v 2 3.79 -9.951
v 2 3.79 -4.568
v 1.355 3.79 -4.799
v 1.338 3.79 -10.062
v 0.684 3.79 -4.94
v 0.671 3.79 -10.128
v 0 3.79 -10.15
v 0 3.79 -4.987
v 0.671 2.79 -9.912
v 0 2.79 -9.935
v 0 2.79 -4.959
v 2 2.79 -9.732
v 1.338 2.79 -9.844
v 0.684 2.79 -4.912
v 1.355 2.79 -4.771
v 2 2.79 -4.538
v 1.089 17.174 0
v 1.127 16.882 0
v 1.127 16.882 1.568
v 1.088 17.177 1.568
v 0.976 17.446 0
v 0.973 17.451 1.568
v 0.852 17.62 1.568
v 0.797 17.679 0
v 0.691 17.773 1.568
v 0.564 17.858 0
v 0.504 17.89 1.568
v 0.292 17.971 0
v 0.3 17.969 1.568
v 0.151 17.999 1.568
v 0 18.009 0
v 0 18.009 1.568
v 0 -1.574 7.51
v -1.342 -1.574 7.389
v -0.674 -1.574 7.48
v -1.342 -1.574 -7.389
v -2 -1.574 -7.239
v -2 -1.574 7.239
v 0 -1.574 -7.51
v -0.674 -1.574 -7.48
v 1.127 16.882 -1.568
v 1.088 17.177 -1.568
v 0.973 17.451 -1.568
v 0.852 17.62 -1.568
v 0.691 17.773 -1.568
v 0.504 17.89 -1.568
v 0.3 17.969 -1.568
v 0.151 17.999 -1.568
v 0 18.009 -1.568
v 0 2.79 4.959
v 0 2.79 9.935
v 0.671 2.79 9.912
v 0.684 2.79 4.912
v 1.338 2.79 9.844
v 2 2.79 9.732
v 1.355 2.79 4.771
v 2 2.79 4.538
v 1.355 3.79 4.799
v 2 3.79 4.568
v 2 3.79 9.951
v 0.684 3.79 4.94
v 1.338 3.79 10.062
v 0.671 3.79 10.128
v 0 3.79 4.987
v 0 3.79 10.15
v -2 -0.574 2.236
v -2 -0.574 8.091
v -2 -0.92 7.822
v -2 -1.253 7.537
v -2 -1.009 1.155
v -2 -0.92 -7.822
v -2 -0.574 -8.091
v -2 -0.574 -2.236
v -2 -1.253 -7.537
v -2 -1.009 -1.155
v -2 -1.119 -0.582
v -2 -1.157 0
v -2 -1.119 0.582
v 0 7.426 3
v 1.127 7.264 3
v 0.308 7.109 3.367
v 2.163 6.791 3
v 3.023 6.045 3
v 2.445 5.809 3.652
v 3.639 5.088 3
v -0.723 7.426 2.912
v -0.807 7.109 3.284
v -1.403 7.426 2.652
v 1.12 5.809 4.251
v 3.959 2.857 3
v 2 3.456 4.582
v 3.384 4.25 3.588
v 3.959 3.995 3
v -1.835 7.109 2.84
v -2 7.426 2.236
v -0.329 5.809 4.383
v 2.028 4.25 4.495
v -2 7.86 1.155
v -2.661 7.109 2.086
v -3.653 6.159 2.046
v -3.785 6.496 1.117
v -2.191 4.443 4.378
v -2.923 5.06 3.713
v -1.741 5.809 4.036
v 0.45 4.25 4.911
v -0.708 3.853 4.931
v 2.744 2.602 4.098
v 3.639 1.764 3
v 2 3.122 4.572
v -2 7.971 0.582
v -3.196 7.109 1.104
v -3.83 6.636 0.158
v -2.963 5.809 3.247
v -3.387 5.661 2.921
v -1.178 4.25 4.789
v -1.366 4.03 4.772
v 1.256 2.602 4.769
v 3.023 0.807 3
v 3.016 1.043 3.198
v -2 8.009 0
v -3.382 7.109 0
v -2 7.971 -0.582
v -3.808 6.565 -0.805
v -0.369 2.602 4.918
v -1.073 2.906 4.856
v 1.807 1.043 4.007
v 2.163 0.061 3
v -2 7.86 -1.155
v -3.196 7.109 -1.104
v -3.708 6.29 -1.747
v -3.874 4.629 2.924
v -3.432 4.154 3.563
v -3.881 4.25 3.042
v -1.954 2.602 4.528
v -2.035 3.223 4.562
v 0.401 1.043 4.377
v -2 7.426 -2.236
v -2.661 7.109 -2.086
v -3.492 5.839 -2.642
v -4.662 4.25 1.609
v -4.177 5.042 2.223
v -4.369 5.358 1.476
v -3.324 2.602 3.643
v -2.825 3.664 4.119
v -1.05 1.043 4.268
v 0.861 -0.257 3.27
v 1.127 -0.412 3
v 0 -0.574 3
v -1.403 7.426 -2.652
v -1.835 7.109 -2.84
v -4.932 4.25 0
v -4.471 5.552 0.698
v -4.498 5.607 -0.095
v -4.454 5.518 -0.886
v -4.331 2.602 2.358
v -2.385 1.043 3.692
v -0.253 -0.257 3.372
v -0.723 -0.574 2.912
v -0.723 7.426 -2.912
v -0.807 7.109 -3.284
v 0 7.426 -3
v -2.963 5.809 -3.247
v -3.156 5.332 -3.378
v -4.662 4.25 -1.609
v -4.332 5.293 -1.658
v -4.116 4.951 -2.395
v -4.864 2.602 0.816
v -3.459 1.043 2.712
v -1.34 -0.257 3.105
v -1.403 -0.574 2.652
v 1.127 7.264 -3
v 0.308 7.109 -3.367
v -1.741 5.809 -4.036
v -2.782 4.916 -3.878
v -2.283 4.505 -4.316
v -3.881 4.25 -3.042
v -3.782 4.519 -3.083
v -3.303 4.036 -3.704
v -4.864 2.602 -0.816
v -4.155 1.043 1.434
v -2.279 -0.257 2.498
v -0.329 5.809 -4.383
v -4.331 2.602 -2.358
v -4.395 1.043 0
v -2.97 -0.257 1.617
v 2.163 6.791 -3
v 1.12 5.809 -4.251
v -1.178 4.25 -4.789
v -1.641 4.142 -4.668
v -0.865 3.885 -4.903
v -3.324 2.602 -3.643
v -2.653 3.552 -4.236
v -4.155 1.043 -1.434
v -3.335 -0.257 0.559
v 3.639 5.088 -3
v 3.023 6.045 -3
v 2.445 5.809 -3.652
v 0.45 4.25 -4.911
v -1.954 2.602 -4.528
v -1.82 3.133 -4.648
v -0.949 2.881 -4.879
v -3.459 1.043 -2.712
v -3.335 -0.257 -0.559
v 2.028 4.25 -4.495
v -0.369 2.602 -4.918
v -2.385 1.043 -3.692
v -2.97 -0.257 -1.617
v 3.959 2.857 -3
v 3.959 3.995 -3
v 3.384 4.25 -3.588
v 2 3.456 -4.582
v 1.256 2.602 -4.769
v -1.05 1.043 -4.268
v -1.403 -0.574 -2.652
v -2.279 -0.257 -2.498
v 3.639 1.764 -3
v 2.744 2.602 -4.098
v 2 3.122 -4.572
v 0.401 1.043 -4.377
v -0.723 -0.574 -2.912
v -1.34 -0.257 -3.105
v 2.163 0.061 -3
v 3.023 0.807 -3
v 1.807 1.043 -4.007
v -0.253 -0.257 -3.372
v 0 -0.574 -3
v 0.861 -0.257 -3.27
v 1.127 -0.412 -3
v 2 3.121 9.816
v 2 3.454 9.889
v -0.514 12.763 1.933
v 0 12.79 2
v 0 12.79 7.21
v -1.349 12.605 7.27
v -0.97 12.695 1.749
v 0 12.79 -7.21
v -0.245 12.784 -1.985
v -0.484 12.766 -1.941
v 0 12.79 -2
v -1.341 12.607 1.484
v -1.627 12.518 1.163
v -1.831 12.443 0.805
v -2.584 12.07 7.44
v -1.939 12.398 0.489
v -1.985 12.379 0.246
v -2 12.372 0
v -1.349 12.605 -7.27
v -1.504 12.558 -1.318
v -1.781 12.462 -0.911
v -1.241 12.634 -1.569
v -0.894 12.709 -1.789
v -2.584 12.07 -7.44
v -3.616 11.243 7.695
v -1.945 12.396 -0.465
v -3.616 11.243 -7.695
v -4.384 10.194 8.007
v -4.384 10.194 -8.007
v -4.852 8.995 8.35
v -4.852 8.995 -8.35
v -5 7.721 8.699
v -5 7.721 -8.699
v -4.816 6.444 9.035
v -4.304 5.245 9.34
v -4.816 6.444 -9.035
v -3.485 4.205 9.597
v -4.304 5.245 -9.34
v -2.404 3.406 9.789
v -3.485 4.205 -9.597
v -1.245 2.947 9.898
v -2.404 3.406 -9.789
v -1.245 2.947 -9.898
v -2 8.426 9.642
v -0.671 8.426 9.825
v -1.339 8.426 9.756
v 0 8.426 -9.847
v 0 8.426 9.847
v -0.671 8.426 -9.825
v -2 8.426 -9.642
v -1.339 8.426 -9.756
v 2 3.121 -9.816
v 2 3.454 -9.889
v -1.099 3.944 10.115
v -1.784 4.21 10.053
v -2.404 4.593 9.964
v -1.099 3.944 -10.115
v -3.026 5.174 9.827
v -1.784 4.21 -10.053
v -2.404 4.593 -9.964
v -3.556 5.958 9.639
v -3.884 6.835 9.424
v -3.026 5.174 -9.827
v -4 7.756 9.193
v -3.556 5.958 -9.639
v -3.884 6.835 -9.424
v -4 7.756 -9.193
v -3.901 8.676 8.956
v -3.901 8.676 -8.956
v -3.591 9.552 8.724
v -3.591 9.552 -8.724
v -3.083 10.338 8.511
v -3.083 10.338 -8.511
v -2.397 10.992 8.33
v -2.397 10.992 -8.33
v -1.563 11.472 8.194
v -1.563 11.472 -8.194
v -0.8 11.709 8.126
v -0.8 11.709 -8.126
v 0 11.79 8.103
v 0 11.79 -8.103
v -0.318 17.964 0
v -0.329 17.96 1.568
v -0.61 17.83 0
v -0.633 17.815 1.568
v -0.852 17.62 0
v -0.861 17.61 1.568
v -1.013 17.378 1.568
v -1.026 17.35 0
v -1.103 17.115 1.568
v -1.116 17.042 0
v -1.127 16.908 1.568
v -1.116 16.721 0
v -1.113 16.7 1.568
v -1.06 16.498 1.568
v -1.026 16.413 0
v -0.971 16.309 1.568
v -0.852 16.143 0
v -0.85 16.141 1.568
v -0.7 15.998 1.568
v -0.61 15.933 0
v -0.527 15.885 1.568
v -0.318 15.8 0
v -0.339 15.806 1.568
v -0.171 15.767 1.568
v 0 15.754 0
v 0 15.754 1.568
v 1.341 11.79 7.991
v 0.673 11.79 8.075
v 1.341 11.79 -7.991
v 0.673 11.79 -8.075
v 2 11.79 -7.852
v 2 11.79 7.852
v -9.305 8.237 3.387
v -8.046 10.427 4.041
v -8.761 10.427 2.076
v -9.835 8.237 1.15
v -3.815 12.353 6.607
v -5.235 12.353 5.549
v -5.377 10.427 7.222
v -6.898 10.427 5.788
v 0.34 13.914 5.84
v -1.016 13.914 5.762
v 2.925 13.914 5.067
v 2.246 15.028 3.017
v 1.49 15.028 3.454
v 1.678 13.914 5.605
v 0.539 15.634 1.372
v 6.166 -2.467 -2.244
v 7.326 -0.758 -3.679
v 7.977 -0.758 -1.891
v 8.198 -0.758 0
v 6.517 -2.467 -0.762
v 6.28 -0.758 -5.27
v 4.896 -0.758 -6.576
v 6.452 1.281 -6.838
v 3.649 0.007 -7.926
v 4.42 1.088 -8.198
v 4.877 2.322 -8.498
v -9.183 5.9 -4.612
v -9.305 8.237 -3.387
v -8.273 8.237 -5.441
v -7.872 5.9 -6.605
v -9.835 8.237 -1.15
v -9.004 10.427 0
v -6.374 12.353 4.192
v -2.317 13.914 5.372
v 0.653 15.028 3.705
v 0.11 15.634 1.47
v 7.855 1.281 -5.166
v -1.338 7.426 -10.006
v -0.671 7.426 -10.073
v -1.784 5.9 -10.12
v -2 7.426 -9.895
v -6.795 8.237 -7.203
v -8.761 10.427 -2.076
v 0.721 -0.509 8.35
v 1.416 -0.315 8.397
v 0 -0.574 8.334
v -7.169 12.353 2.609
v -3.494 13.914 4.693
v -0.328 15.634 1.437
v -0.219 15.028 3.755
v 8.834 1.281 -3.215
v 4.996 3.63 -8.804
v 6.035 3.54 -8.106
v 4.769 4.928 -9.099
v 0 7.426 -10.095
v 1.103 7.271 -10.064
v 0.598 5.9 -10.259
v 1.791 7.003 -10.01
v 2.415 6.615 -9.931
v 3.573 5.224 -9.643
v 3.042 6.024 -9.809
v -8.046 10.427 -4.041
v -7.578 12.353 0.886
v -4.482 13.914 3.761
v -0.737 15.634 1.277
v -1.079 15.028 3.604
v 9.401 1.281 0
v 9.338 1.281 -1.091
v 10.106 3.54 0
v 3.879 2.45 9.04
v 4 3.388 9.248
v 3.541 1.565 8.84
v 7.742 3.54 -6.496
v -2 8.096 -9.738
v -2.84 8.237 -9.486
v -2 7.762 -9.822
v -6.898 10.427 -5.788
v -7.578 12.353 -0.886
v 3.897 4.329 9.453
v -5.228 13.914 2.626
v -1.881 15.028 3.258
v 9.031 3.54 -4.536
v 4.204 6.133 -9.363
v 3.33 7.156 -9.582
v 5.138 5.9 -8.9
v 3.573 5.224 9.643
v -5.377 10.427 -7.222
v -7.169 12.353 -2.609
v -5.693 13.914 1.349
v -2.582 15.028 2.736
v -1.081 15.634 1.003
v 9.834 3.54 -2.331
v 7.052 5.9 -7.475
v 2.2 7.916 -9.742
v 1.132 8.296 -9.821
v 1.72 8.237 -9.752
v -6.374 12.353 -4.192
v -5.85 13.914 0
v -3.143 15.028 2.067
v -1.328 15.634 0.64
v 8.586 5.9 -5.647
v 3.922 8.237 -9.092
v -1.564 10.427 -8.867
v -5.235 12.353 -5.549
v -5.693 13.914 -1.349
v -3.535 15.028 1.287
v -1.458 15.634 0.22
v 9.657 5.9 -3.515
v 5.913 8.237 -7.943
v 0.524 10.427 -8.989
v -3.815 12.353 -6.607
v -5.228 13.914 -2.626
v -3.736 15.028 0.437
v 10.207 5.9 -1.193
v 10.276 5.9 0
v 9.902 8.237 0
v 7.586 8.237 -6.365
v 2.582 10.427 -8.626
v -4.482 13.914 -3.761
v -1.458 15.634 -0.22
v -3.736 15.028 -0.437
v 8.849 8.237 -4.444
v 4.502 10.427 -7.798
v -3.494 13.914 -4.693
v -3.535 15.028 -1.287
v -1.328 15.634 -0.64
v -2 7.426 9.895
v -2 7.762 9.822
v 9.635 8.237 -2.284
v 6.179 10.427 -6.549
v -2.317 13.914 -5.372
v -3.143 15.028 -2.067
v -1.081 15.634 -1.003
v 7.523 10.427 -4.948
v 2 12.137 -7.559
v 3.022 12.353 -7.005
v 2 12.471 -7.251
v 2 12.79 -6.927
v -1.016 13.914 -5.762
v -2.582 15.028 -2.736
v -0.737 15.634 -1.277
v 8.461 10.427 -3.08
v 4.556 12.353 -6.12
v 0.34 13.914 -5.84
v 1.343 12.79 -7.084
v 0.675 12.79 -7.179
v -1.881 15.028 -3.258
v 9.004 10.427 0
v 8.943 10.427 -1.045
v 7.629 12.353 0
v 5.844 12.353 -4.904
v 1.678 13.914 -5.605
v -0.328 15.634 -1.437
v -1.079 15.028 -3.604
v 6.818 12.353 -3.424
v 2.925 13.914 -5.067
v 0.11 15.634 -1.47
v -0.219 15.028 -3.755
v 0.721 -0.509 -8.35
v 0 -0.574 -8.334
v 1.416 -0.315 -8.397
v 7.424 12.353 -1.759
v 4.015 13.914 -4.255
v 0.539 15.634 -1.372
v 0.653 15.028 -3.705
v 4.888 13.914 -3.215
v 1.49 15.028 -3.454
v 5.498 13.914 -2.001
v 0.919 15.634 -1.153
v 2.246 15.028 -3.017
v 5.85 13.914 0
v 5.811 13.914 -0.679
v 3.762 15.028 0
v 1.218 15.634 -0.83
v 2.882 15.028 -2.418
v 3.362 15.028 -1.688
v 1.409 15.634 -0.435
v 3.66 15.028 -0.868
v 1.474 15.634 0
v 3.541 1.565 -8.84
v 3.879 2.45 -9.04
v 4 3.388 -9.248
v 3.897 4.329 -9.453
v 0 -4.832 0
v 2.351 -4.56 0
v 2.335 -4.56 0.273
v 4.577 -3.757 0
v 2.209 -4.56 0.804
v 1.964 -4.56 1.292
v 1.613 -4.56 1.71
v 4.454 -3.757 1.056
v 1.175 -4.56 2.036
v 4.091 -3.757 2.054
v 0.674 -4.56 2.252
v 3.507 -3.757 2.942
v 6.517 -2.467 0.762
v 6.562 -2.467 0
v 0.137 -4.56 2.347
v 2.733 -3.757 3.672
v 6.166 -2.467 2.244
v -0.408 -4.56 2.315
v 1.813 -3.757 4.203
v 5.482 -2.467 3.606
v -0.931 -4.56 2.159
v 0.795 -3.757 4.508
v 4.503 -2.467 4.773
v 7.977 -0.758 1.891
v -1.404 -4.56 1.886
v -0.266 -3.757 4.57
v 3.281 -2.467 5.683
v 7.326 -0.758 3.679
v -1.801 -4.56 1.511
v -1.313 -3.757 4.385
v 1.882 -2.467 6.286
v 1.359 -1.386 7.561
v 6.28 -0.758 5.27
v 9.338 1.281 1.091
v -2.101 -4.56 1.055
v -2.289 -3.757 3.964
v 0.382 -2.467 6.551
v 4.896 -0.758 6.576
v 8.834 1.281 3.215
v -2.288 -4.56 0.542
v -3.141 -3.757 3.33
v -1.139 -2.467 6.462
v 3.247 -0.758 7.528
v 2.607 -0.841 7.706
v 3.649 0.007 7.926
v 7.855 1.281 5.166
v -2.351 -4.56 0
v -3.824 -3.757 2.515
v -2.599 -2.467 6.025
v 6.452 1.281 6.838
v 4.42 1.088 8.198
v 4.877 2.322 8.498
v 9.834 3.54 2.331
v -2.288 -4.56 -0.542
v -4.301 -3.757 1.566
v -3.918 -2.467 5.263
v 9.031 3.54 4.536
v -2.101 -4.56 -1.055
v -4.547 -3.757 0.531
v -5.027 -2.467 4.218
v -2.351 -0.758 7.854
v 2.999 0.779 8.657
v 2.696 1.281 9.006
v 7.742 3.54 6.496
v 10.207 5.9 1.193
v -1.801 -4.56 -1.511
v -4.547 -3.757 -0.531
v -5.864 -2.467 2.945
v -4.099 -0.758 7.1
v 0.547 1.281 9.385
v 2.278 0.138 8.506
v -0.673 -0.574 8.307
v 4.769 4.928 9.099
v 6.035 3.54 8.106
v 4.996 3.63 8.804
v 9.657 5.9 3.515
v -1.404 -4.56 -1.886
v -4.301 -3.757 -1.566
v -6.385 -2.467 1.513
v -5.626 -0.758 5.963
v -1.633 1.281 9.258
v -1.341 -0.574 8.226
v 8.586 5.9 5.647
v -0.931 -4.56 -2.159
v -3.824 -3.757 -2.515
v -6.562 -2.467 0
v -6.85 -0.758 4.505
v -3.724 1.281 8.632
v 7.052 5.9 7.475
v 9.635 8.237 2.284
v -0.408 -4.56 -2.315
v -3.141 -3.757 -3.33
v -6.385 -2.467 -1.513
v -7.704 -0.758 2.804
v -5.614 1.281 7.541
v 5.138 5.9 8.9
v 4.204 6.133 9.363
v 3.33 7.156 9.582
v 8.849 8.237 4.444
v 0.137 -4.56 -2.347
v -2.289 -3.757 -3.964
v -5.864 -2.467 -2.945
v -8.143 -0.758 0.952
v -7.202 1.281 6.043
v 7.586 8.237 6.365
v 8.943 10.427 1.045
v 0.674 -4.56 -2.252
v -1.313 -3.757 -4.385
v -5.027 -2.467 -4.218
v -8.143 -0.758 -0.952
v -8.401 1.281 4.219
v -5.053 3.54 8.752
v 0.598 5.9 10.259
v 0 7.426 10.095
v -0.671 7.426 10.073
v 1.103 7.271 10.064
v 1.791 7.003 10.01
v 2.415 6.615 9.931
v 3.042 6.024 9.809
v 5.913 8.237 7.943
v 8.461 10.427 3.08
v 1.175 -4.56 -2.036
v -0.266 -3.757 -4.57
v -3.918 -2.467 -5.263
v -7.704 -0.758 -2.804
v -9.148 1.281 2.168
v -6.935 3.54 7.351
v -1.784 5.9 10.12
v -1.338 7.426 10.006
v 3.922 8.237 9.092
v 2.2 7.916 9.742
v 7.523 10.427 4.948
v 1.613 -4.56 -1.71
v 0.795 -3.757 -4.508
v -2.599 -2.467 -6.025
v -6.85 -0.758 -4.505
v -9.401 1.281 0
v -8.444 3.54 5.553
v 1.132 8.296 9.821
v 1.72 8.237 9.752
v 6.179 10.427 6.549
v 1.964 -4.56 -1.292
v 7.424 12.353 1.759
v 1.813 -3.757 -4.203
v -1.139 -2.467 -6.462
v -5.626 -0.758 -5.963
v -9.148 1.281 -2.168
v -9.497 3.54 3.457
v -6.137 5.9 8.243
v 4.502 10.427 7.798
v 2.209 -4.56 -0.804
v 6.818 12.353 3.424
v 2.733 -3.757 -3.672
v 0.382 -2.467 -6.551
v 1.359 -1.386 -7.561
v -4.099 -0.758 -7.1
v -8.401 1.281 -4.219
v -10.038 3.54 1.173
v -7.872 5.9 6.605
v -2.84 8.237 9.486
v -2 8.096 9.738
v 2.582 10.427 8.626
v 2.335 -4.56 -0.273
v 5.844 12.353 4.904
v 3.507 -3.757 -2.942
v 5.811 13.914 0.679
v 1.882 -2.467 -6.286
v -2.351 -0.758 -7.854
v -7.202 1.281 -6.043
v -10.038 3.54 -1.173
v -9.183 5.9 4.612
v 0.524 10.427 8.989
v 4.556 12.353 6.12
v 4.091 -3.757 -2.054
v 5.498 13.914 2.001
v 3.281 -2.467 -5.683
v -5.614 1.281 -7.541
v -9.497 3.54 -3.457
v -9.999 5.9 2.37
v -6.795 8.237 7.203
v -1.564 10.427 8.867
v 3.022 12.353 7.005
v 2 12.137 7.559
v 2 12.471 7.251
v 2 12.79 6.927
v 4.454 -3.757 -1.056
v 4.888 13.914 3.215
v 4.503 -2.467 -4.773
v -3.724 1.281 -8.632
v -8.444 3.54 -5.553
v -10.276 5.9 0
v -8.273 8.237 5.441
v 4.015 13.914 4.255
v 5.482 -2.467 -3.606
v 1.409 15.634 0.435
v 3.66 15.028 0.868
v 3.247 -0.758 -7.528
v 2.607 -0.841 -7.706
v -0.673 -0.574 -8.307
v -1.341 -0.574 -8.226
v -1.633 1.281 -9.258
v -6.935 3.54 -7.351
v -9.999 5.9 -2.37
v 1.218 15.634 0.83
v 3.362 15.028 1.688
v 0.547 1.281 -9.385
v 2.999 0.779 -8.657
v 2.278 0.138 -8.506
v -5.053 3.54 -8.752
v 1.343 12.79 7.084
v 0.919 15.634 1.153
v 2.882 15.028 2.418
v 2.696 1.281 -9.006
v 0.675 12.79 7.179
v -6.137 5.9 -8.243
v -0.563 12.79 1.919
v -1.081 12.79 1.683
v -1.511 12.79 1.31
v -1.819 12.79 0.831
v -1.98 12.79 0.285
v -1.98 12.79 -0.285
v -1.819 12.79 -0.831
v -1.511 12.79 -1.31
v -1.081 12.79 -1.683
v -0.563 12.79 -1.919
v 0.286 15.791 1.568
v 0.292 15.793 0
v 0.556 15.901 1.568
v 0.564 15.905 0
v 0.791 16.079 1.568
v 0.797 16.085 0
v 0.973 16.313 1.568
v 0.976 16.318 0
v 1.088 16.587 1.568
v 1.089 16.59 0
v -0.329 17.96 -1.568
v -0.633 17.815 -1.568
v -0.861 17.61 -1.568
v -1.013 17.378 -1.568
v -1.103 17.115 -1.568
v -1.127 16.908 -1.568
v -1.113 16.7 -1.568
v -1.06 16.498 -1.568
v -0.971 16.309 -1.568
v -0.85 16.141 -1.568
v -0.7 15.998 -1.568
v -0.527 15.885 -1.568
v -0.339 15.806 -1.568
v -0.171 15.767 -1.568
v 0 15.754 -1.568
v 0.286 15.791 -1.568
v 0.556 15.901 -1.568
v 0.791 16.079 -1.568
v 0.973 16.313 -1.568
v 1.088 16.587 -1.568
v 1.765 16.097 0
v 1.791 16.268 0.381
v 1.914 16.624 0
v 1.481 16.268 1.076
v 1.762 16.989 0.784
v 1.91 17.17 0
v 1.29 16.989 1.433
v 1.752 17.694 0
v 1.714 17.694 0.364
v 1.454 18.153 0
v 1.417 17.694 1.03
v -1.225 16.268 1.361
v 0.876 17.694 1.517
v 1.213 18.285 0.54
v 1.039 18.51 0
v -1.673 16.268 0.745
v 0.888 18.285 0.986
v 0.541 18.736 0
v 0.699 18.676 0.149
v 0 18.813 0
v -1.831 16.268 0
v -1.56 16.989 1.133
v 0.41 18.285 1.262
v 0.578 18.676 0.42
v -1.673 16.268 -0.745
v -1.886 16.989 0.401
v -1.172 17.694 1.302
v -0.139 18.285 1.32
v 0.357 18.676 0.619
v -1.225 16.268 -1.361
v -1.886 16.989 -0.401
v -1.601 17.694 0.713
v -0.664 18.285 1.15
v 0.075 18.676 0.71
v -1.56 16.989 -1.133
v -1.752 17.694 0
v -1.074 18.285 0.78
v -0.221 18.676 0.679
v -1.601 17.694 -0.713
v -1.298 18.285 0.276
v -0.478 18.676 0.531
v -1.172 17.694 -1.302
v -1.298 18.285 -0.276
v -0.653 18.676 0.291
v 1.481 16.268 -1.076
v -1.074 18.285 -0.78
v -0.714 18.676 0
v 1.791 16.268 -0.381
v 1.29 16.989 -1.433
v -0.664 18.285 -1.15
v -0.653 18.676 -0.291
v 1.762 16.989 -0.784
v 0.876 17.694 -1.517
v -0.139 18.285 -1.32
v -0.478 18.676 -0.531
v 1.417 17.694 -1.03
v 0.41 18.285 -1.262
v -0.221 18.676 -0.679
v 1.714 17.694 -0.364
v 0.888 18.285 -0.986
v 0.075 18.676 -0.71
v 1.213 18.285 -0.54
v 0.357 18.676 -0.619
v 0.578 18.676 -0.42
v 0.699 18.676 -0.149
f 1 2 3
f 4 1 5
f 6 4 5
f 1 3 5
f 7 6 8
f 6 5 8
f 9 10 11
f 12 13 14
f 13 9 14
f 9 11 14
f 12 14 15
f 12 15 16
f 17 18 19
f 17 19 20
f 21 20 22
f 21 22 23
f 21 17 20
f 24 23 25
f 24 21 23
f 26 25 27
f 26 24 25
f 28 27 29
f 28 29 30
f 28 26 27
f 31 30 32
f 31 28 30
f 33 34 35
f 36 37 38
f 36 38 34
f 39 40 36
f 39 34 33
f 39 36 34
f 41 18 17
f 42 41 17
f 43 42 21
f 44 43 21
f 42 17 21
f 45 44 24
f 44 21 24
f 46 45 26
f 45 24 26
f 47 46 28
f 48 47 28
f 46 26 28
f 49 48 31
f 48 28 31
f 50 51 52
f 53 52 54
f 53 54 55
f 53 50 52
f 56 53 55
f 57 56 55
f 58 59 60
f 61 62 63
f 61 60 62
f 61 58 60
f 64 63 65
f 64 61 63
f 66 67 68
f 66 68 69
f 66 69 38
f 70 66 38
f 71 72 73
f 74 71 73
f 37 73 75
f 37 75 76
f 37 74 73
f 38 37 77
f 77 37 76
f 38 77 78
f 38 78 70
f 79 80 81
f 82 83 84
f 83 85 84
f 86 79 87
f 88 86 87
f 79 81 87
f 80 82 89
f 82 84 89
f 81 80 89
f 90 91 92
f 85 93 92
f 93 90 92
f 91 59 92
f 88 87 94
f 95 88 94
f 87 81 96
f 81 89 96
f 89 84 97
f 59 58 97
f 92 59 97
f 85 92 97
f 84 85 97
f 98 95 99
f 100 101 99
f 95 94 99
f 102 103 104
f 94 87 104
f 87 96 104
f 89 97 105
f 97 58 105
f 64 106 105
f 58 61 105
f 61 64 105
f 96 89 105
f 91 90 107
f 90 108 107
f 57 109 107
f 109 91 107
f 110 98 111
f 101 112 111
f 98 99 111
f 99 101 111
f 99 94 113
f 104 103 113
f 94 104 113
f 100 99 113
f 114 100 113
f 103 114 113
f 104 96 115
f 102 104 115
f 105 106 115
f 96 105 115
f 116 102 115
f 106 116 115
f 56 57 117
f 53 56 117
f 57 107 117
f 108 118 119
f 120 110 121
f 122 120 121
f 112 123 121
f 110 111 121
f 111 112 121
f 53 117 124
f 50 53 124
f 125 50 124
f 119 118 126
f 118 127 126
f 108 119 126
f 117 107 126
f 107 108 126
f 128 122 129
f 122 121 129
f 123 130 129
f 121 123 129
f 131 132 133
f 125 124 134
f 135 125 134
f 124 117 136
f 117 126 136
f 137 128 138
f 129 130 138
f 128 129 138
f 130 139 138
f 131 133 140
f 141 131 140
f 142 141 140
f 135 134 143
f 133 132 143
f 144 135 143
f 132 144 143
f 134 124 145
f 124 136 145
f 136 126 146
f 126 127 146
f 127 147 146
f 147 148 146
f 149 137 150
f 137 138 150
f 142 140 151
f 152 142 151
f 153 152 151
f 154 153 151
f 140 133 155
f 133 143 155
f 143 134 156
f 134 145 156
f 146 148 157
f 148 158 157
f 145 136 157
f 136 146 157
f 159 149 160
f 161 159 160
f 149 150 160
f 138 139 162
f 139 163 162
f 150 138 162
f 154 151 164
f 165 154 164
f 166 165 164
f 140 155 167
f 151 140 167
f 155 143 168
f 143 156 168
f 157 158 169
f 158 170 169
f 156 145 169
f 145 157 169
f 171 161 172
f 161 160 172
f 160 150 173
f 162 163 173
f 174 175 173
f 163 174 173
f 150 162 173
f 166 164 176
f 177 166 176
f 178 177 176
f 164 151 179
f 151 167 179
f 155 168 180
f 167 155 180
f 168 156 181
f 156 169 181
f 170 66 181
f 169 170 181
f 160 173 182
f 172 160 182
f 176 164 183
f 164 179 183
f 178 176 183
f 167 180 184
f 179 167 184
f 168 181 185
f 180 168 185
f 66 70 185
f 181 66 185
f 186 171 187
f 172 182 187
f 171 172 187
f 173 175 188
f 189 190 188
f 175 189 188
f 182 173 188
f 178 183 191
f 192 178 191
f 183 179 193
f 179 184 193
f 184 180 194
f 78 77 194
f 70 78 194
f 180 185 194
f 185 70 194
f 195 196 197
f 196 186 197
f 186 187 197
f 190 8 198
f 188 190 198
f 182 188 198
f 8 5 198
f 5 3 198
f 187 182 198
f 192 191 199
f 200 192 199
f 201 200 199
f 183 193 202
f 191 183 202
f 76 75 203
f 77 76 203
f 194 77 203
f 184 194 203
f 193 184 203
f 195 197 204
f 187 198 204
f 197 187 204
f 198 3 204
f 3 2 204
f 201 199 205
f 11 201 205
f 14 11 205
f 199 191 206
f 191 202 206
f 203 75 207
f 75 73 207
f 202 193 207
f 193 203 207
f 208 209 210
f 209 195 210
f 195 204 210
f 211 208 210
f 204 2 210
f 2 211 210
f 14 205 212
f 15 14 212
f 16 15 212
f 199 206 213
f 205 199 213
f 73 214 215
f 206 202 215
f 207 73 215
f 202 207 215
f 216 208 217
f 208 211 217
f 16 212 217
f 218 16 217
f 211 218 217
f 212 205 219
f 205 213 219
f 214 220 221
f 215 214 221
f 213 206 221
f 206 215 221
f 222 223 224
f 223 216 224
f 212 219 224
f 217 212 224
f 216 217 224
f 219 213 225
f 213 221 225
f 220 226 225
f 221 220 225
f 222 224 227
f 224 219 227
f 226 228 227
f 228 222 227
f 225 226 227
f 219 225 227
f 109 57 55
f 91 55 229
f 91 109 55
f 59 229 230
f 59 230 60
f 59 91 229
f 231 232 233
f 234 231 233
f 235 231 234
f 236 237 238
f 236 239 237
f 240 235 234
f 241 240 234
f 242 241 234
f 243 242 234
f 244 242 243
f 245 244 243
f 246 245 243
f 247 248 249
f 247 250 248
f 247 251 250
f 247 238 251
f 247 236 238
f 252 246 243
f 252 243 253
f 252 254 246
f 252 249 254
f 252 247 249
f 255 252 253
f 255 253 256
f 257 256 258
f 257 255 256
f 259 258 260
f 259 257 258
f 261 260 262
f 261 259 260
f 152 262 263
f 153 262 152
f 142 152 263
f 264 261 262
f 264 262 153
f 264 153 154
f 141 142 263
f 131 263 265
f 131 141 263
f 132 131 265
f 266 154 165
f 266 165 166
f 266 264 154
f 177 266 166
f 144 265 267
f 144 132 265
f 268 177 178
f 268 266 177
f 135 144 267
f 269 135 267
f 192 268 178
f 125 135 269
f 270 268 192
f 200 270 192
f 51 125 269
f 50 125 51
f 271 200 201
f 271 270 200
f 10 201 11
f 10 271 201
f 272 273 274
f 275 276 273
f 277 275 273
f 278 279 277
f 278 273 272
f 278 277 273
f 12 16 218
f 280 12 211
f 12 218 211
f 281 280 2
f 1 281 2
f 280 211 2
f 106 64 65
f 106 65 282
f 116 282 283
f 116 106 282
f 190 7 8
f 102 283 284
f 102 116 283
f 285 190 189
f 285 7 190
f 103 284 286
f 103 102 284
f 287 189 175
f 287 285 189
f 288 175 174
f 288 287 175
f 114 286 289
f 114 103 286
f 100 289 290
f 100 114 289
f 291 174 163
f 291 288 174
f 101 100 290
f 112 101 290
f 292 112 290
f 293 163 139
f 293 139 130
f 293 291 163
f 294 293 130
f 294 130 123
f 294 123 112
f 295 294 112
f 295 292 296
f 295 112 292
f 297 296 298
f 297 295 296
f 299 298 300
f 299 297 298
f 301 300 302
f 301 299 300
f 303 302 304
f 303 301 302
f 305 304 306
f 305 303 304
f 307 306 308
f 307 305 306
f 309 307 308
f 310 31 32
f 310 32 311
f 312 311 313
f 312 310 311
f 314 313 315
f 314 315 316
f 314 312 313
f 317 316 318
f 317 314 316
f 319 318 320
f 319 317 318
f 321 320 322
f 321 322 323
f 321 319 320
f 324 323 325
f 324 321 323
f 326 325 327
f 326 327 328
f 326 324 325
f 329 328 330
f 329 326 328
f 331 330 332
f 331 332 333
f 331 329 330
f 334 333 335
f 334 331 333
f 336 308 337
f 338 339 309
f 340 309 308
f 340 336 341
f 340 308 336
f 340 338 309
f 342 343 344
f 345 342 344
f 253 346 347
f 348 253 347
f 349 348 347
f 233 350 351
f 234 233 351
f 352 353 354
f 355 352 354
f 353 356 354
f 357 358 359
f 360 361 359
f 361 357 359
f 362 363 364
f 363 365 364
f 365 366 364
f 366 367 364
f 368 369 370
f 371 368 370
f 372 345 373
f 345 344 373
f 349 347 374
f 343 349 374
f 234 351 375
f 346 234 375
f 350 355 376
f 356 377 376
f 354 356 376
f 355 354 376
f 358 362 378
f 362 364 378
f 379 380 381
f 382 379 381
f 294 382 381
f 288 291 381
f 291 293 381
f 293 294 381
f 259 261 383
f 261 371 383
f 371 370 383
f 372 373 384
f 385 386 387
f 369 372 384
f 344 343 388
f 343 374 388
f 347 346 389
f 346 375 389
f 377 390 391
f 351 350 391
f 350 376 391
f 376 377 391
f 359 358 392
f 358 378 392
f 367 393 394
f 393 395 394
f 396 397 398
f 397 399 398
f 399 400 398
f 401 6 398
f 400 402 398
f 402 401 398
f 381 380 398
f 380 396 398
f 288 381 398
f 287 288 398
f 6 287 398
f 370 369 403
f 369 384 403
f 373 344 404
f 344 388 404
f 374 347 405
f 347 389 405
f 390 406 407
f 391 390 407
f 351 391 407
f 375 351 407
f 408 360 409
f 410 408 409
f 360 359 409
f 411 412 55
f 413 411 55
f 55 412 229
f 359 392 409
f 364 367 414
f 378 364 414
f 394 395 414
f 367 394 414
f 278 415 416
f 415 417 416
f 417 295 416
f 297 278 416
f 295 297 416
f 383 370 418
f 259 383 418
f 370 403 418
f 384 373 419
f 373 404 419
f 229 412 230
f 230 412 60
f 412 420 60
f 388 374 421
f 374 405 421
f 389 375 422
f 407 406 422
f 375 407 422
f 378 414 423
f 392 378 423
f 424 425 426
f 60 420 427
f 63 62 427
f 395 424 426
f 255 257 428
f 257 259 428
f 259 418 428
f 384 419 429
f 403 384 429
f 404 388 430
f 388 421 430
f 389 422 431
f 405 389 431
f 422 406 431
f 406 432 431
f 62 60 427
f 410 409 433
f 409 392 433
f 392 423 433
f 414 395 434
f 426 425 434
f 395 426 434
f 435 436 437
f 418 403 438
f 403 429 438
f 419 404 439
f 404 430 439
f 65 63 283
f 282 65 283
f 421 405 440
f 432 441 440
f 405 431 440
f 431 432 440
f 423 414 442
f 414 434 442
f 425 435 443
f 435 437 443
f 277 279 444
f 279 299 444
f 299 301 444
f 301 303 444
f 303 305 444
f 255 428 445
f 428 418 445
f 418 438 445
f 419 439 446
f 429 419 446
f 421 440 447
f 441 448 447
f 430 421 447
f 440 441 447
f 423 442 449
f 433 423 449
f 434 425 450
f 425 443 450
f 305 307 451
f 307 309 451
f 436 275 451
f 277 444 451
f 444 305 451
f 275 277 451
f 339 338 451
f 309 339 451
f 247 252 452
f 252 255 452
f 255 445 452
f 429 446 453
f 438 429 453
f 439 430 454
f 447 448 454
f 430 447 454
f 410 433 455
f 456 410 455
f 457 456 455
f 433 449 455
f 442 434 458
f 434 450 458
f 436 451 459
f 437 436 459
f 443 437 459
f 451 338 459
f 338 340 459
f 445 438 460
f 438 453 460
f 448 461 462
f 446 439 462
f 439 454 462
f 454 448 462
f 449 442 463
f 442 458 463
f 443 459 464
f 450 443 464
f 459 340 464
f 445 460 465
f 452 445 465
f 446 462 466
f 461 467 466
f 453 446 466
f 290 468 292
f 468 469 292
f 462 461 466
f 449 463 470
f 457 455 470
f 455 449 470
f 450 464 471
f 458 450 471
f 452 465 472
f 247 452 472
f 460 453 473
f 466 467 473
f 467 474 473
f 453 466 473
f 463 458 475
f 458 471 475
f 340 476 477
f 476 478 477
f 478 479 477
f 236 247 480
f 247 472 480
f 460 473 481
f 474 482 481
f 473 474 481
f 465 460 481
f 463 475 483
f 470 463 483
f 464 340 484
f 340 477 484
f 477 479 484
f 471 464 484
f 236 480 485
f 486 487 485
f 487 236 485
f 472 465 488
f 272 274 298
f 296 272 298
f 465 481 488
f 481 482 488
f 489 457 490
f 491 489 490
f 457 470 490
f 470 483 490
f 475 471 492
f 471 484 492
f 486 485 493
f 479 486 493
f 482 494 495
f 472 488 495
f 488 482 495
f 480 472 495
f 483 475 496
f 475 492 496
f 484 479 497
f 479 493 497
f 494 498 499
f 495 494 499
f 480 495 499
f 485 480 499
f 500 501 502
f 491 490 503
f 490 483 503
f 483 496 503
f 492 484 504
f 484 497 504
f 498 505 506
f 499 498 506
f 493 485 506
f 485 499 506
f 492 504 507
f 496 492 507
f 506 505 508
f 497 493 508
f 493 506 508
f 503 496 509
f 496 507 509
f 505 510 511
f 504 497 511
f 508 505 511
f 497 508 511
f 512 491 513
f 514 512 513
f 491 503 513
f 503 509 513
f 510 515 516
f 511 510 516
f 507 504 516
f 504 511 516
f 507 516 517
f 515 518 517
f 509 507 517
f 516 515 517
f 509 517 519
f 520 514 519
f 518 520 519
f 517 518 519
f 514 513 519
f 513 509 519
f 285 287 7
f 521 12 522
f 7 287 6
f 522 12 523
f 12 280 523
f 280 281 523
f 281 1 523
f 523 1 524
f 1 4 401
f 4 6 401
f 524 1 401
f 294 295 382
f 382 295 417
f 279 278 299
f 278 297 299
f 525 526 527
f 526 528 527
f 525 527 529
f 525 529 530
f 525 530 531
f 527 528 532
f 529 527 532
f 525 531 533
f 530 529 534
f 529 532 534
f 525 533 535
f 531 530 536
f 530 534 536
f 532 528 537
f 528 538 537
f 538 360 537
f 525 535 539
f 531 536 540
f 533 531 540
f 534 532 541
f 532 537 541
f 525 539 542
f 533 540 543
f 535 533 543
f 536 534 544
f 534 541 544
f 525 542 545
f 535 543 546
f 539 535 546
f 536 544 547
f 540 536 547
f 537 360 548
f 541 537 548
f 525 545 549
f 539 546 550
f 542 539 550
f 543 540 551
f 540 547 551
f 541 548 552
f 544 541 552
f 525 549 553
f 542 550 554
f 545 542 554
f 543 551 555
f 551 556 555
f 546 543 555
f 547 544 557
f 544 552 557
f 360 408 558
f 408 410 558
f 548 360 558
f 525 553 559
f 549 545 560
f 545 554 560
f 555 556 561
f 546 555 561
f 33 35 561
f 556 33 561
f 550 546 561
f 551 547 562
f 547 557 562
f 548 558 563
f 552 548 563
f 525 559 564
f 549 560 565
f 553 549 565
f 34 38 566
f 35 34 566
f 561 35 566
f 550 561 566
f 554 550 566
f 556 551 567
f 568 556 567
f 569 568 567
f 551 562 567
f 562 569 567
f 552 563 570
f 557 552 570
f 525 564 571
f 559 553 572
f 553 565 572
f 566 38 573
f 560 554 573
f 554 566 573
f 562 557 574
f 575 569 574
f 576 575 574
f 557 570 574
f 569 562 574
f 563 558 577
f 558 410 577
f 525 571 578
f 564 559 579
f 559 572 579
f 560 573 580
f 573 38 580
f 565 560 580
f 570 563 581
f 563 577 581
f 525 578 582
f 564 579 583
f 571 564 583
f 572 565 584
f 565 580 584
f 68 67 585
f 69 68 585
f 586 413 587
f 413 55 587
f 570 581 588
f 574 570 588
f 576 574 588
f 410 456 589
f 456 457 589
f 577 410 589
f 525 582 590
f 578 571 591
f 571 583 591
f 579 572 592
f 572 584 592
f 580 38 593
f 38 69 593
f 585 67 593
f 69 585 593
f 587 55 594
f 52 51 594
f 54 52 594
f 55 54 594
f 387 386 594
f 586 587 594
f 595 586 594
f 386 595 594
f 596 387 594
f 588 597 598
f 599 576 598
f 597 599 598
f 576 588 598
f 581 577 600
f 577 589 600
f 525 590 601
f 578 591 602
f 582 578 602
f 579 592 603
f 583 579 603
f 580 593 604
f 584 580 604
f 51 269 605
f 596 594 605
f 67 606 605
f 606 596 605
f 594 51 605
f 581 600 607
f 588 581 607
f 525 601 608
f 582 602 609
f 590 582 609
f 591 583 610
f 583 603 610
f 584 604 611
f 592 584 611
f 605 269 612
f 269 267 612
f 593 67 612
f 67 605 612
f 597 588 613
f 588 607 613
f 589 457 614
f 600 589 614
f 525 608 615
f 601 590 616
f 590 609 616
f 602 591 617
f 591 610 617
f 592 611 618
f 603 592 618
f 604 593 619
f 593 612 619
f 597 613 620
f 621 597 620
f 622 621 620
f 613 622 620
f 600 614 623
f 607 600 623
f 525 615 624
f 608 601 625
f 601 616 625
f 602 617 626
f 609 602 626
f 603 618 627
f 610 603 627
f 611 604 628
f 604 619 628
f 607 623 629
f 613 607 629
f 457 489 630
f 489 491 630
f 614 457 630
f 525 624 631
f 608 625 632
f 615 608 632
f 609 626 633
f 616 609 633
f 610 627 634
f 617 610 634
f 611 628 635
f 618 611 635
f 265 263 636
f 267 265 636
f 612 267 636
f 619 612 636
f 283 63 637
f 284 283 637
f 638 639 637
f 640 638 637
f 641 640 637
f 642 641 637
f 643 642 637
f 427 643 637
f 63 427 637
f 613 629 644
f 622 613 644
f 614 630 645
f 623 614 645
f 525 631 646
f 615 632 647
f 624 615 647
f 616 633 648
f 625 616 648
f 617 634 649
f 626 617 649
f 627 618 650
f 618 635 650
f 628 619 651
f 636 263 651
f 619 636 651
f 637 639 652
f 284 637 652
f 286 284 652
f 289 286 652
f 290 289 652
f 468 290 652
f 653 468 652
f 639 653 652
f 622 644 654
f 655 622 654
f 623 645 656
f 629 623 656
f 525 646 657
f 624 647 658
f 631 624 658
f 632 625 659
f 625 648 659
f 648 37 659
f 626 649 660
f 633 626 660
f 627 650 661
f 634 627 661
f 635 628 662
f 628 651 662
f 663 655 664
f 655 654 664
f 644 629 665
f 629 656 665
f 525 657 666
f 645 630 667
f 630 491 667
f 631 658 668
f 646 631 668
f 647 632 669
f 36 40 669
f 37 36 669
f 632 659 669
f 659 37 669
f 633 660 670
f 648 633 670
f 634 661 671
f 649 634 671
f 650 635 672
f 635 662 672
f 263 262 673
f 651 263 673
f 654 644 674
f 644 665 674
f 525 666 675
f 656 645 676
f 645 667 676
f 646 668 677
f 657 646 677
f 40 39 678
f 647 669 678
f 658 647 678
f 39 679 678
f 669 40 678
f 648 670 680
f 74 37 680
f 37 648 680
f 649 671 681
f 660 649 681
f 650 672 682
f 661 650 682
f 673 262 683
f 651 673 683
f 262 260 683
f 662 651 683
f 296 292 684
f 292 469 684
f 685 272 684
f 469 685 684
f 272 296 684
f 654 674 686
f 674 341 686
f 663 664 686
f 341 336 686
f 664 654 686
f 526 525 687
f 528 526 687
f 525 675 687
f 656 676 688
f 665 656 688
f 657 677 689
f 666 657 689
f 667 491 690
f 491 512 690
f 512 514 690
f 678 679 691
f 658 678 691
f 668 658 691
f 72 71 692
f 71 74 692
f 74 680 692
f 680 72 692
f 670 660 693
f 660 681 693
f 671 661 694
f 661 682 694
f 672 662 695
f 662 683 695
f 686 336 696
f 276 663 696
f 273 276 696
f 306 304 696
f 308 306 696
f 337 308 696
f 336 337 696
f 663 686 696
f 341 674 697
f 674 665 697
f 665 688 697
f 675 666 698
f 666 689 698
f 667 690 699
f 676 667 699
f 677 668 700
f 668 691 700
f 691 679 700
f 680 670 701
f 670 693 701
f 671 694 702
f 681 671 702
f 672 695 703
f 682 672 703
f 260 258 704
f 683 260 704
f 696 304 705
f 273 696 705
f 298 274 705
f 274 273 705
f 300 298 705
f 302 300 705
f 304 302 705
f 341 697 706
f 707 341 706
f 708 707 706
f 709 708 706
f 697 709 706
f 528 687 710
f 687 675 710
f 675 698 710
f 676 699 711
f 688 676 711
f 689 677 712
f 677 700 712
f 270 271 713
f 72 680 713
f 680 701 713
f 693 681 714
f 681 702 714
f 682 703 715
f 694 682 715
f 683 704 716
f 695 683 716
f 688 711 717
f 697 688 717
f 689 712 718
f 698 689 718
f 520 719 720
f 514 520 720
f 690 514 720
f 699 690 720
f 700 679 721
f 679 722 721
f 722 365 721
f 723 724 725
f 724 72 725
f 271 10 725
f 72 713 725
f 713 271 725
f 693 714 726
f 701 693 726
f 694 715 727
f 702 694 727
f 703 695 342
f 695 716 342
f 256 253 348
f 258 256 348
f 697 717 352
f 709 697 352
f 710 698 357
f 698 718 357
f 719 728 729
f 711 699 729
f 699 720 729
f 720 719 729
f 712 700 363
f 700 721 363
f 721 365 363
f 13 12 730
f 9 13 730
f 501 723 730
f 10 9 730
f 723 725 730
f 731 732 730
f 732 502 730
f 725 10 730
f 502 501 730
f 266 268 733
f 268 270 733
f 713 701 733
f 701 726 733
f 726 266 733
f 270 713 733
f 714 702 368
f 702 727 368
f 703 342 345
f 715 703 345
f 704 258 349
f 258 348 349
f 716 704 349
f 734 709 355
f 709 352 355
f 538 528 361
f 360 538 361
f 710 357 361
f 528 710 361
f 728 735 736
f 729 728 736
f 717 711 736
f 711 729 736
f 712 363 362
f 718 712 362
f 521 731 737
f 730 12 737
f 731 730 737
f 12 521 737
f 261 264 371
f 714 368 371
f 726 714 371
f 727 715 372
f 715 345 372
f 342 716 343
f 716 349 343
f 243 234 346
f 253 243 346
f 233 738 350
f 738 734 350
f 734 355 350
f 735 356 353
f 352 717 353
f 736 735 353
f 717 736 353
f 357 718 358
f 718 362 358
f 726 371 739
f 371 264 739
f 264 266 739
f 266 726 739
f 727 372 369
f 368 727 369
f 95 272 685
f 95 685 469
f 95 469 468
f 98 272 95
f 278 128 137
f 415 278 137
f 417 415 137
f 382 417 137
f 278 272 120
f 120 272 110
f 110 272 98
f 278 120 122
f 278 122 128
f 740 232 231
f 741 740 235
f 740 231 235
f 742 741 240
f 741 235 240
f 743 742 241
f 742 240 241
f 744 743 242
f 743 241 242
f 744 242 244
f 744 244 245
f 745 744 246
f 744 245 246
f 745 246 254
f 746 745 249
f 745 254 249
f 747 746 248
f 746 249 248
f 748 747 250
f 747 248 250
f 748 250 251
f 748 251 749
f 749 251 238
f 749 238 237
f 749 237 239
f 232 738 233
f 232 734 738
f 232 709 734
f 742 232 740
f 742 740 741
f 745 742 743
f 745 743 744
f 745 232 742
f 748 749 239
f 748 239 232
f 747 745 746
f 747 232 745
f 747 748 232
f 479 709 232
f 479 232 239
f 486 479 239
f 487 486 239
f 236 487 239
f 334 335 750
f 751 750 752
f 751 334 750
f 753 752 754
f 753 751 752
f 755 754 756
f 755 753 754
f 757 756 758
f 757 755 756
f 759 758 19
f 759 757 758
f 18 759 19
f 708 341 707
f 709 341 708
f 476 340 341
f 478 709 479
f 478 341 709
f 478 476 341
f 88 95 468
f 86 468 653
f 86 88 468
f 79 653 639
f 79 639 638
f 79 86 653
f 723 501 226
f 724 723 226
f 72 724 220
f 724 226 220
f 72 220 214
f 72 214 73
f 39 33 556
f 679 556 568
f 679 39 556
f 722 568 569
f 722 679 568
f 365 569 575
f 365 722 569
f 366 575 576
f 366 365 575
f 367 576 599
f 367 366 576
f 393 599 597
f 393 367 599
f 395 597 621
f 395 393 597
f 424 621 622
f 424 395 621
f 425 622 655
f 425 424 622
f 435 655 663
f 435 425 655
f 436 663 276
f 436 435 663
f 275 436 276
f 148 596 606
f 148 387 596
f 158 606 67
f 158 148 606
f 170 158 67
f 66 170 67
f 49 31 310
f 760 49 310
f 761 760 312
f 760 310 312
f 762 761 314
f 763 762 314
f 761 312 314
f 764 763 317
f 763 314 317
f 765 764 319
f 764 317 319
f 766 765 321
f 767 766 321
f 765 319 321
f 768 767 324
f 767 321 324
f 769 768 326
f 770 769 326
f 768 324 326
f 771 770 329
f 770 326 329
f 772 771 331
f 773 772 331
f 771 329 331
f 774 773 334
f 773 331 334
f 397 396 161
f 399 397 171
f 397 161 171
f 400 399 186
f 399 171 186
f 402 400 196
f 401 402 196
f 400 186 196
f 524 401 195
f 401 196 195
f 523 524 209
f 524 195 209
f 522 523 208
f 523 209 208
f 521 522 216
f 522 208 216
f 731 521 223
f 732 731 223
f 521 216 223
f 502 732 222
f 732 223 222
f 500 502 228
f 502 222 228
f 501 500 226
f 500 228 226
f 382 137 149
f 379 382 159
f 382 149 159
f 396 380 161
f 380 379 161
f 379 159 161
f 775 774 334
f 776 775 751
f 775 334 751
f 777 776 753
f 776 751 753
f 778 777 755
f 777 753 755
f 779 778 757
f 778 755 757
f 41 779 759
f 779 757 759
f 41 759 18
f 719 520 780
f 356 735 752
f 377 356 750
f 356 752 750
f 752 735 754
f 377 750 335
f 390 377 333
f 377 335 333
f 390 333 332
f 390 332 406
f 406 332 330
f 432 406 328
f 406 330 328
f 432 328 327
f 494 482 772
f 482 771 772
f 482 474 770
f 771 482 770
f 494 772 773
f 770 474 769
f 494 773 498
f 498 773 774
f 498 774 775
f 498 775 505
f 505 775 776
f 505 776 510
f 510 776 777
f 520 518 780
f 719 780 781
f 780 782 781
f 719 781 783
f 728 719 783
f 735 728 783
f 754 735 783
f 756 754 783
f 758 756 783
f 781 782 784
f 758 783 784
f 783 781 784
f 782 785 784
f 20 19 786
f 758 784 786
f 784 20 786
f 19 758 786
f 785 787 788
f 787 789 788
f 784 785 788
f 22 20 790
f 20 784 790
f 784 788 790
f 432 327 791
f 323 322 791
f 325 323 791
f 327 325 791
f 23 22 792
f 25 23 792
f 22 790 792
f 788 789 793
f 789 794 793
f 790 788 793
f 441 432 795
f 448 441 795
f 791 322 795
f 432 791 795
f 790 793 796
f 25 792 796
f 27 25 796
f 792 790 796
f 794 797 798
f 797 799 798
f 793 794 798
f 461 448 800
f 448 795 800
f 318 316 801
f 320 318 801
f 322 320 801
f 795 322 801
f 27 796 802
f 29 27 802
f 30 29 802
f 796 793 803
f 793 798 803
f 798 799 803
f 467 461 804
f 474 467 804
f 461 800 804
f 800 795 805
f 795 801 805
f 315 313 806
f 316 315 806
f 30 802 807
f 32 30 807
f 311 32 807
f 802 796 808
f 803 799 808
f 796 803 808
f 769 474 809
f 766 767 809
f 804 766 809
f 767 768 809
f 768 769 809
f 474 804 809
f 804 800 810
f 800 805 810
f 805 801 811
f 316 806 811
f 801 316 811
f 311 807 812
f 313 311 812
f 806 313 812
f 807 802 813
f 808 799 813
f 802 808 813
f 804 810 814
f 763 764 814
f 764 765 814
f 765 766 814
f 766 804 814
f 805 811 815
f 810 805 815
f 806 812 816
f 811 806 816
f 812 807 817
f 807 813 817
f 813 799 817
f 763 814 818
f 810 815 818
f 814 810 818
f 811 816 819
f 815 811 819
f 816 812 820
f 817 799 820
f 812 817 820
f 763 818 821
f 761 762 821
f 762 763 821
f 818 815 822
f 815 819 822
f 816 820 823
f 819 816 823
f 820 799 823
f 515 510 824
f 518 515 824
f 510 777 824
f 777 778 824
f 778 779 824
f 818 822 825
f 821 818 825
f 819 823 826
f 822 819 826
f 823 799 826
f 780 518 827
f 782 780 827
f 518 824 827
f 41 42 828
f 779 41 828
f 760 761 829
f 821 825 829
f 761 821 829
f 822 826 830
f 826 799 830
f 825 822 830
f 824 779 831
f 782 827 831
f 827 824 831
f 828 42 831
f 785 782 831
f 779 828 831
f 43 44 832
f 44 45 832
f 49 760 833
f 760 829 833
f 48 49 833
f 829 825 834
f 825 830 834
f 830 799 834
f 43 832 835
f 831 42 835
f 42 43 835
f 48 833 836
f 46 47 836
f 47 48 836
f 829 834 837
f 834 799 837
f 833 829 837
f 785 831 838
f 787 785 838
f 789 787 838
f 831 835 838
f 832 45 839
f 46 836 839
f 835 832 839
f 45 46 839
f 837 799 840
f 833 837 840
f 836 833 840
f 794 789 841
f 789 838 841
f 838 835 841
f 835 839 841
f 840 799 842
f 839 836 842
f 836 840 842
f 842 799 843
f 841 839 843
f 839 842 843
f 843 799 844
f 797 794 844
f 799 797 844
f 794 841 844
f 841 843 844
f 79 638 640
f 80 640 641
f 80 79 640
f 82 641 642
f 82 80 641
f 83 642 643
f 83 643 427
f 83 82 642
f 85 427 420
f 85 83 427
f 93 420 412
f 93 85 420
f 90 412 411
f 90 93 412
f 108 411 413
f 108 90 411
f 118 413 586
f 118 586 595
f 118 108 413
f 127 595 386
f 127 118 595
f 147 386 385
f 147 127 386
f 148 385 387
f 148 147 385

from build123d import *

# Parameters (mm, degrees)
F2_DEPTH      = 25.4
F2_DEPTH_BACK = 25.4
F3_DEPTH      = 25.4
F3_DEPTH_BACK = 25.4


with BuildPart() as f1:
    # F0 (on Top) → F1 (revolve)
    with BuildSketch(Plane.XY):
        with BuildLine():
            ThreePointArc((1.4741766444, 15.6340406001), (1.7521250826, 17.6942663006), (0, 18.8131241852))
            Line((0, 18.8131241852), (0, 18.009214877))
            ThreePointArc((0, 18.009214877), (0.7972124014, 17.6789986882), (1.1274285902, 16.8817862868))
            ThreePointArc((1.1274285902, 16.8817862868), (0.7972124014, 16.0845738854), (0, 15.7543576967))
            Line((0, 15.7543576967), (0, 12.7899108205))
            Line((0, 12.7899108205), (2, 12.7899108205))
            Line((2, 12.7899108205), (2, 11.7899108205))
            Line((2, 11.7899108205), (0, 11.7899108205))
            Line((0, 11.7899108205), (0, 8.4259435534))
            ThreePointArc((0, 8.4259435534), (5, 3.4259435534), (0, -1.5740564466))
            Line((0, -1.5740564466), (0, -4.8317939343))
            ThreePointArc((0, -4.8317939343), (10.2594295647, 4.7152185858), (1.4741766444, 15.6340406001))
        make_face()
    revolve(axis=Axis((0, 32.3345517981, 0), (0, -1, 0)))

    # F0 (on Top) → F2 (cut, two sides)
    with BuildSketch(Plane.XY) as f2_sk:
        with BuildLine():
            Line((2, 12.7899108205), (0, 12.7899108205))
            ThreePointArc((0, 12.7899108205), (-5, 7.7899108205), (0, 2.7899108205))
            Line((0, 2.7899108205), (2, 2.7899108205))
            Line((2, 2.7899108205), (2, 3.7899108205))
            Line((2, 3.7899108205), (0, 3.7899108205))
            ThreePointArc((0, 3.7899108205), (-4, 7.7899108205), (0, 11.7899108205))
            Line((0, 11.7899108205), (2, 11.7899108205))
            Line((2, 11.7899108205), (2, 12.7899108205))
        make_face()
        with BuildLine():
            Line((-2, -1.5740564466), (0, -1.5740564466))
            ThreePointArc((0, -1.5740564466), (5, 3.4259435534), (0, 8.4259435534))
            Line((0, 8.4259435534), (-2, 8.4259435534))
            Line((-2, 8.4259435534), (-2, 7.4259435534))
            Line((-2, 7.4259435534), (0, 7.4259435534))
            ThreePointArc((0, 7.4259435534), (4, 3.4259435534), (0, -0.5740564466))
            Line((0, -0.5740564466), (-2, -0.5740564466))
            Line((-2, -0.5740564466), (-2, -1.5740564466))
        make_face()
    extrude(amount=-F2_DEPTH, mode=Mode.SUBTRACT)
    extrude(f2_sk.sketch, amount=F2_DEPTH_BACK, mode=Mode.SUBTRACT)

    # F0 (on Top) → F3 (cut, two sides)
    with BuildSketch(Plane.XY) as f3_sk:
        with BuildLine():
            Line((0, 15.7543576967), (0, 18.009214877))
            ThreePointArc((0, 18.009214877), (-1.1274285902, 16.8817862868), (0, 15.7543576967))
        make_face()
        with BuildLine():
            ThreePointArc((1.1274285902, 16.8817862868), (0.7972124014, 17.6789986882), (0, 18.009214877))
            Line((0, 18.009214877), (0, 15.7543576967))
            ThreePointArc((0, 15.7543576967), (0.7972124014, 16.0845738854), (1.1274285902, 16.8817862868))
        make_face()
    extrude(amount=-F3_DEPTH, mode=Mode.SUBTRACT)
    extrude(f3_sk.sketch, amount=F3_DEPTH_BACK, mode=Mode.SUBTRACT)


solid = f1.part
